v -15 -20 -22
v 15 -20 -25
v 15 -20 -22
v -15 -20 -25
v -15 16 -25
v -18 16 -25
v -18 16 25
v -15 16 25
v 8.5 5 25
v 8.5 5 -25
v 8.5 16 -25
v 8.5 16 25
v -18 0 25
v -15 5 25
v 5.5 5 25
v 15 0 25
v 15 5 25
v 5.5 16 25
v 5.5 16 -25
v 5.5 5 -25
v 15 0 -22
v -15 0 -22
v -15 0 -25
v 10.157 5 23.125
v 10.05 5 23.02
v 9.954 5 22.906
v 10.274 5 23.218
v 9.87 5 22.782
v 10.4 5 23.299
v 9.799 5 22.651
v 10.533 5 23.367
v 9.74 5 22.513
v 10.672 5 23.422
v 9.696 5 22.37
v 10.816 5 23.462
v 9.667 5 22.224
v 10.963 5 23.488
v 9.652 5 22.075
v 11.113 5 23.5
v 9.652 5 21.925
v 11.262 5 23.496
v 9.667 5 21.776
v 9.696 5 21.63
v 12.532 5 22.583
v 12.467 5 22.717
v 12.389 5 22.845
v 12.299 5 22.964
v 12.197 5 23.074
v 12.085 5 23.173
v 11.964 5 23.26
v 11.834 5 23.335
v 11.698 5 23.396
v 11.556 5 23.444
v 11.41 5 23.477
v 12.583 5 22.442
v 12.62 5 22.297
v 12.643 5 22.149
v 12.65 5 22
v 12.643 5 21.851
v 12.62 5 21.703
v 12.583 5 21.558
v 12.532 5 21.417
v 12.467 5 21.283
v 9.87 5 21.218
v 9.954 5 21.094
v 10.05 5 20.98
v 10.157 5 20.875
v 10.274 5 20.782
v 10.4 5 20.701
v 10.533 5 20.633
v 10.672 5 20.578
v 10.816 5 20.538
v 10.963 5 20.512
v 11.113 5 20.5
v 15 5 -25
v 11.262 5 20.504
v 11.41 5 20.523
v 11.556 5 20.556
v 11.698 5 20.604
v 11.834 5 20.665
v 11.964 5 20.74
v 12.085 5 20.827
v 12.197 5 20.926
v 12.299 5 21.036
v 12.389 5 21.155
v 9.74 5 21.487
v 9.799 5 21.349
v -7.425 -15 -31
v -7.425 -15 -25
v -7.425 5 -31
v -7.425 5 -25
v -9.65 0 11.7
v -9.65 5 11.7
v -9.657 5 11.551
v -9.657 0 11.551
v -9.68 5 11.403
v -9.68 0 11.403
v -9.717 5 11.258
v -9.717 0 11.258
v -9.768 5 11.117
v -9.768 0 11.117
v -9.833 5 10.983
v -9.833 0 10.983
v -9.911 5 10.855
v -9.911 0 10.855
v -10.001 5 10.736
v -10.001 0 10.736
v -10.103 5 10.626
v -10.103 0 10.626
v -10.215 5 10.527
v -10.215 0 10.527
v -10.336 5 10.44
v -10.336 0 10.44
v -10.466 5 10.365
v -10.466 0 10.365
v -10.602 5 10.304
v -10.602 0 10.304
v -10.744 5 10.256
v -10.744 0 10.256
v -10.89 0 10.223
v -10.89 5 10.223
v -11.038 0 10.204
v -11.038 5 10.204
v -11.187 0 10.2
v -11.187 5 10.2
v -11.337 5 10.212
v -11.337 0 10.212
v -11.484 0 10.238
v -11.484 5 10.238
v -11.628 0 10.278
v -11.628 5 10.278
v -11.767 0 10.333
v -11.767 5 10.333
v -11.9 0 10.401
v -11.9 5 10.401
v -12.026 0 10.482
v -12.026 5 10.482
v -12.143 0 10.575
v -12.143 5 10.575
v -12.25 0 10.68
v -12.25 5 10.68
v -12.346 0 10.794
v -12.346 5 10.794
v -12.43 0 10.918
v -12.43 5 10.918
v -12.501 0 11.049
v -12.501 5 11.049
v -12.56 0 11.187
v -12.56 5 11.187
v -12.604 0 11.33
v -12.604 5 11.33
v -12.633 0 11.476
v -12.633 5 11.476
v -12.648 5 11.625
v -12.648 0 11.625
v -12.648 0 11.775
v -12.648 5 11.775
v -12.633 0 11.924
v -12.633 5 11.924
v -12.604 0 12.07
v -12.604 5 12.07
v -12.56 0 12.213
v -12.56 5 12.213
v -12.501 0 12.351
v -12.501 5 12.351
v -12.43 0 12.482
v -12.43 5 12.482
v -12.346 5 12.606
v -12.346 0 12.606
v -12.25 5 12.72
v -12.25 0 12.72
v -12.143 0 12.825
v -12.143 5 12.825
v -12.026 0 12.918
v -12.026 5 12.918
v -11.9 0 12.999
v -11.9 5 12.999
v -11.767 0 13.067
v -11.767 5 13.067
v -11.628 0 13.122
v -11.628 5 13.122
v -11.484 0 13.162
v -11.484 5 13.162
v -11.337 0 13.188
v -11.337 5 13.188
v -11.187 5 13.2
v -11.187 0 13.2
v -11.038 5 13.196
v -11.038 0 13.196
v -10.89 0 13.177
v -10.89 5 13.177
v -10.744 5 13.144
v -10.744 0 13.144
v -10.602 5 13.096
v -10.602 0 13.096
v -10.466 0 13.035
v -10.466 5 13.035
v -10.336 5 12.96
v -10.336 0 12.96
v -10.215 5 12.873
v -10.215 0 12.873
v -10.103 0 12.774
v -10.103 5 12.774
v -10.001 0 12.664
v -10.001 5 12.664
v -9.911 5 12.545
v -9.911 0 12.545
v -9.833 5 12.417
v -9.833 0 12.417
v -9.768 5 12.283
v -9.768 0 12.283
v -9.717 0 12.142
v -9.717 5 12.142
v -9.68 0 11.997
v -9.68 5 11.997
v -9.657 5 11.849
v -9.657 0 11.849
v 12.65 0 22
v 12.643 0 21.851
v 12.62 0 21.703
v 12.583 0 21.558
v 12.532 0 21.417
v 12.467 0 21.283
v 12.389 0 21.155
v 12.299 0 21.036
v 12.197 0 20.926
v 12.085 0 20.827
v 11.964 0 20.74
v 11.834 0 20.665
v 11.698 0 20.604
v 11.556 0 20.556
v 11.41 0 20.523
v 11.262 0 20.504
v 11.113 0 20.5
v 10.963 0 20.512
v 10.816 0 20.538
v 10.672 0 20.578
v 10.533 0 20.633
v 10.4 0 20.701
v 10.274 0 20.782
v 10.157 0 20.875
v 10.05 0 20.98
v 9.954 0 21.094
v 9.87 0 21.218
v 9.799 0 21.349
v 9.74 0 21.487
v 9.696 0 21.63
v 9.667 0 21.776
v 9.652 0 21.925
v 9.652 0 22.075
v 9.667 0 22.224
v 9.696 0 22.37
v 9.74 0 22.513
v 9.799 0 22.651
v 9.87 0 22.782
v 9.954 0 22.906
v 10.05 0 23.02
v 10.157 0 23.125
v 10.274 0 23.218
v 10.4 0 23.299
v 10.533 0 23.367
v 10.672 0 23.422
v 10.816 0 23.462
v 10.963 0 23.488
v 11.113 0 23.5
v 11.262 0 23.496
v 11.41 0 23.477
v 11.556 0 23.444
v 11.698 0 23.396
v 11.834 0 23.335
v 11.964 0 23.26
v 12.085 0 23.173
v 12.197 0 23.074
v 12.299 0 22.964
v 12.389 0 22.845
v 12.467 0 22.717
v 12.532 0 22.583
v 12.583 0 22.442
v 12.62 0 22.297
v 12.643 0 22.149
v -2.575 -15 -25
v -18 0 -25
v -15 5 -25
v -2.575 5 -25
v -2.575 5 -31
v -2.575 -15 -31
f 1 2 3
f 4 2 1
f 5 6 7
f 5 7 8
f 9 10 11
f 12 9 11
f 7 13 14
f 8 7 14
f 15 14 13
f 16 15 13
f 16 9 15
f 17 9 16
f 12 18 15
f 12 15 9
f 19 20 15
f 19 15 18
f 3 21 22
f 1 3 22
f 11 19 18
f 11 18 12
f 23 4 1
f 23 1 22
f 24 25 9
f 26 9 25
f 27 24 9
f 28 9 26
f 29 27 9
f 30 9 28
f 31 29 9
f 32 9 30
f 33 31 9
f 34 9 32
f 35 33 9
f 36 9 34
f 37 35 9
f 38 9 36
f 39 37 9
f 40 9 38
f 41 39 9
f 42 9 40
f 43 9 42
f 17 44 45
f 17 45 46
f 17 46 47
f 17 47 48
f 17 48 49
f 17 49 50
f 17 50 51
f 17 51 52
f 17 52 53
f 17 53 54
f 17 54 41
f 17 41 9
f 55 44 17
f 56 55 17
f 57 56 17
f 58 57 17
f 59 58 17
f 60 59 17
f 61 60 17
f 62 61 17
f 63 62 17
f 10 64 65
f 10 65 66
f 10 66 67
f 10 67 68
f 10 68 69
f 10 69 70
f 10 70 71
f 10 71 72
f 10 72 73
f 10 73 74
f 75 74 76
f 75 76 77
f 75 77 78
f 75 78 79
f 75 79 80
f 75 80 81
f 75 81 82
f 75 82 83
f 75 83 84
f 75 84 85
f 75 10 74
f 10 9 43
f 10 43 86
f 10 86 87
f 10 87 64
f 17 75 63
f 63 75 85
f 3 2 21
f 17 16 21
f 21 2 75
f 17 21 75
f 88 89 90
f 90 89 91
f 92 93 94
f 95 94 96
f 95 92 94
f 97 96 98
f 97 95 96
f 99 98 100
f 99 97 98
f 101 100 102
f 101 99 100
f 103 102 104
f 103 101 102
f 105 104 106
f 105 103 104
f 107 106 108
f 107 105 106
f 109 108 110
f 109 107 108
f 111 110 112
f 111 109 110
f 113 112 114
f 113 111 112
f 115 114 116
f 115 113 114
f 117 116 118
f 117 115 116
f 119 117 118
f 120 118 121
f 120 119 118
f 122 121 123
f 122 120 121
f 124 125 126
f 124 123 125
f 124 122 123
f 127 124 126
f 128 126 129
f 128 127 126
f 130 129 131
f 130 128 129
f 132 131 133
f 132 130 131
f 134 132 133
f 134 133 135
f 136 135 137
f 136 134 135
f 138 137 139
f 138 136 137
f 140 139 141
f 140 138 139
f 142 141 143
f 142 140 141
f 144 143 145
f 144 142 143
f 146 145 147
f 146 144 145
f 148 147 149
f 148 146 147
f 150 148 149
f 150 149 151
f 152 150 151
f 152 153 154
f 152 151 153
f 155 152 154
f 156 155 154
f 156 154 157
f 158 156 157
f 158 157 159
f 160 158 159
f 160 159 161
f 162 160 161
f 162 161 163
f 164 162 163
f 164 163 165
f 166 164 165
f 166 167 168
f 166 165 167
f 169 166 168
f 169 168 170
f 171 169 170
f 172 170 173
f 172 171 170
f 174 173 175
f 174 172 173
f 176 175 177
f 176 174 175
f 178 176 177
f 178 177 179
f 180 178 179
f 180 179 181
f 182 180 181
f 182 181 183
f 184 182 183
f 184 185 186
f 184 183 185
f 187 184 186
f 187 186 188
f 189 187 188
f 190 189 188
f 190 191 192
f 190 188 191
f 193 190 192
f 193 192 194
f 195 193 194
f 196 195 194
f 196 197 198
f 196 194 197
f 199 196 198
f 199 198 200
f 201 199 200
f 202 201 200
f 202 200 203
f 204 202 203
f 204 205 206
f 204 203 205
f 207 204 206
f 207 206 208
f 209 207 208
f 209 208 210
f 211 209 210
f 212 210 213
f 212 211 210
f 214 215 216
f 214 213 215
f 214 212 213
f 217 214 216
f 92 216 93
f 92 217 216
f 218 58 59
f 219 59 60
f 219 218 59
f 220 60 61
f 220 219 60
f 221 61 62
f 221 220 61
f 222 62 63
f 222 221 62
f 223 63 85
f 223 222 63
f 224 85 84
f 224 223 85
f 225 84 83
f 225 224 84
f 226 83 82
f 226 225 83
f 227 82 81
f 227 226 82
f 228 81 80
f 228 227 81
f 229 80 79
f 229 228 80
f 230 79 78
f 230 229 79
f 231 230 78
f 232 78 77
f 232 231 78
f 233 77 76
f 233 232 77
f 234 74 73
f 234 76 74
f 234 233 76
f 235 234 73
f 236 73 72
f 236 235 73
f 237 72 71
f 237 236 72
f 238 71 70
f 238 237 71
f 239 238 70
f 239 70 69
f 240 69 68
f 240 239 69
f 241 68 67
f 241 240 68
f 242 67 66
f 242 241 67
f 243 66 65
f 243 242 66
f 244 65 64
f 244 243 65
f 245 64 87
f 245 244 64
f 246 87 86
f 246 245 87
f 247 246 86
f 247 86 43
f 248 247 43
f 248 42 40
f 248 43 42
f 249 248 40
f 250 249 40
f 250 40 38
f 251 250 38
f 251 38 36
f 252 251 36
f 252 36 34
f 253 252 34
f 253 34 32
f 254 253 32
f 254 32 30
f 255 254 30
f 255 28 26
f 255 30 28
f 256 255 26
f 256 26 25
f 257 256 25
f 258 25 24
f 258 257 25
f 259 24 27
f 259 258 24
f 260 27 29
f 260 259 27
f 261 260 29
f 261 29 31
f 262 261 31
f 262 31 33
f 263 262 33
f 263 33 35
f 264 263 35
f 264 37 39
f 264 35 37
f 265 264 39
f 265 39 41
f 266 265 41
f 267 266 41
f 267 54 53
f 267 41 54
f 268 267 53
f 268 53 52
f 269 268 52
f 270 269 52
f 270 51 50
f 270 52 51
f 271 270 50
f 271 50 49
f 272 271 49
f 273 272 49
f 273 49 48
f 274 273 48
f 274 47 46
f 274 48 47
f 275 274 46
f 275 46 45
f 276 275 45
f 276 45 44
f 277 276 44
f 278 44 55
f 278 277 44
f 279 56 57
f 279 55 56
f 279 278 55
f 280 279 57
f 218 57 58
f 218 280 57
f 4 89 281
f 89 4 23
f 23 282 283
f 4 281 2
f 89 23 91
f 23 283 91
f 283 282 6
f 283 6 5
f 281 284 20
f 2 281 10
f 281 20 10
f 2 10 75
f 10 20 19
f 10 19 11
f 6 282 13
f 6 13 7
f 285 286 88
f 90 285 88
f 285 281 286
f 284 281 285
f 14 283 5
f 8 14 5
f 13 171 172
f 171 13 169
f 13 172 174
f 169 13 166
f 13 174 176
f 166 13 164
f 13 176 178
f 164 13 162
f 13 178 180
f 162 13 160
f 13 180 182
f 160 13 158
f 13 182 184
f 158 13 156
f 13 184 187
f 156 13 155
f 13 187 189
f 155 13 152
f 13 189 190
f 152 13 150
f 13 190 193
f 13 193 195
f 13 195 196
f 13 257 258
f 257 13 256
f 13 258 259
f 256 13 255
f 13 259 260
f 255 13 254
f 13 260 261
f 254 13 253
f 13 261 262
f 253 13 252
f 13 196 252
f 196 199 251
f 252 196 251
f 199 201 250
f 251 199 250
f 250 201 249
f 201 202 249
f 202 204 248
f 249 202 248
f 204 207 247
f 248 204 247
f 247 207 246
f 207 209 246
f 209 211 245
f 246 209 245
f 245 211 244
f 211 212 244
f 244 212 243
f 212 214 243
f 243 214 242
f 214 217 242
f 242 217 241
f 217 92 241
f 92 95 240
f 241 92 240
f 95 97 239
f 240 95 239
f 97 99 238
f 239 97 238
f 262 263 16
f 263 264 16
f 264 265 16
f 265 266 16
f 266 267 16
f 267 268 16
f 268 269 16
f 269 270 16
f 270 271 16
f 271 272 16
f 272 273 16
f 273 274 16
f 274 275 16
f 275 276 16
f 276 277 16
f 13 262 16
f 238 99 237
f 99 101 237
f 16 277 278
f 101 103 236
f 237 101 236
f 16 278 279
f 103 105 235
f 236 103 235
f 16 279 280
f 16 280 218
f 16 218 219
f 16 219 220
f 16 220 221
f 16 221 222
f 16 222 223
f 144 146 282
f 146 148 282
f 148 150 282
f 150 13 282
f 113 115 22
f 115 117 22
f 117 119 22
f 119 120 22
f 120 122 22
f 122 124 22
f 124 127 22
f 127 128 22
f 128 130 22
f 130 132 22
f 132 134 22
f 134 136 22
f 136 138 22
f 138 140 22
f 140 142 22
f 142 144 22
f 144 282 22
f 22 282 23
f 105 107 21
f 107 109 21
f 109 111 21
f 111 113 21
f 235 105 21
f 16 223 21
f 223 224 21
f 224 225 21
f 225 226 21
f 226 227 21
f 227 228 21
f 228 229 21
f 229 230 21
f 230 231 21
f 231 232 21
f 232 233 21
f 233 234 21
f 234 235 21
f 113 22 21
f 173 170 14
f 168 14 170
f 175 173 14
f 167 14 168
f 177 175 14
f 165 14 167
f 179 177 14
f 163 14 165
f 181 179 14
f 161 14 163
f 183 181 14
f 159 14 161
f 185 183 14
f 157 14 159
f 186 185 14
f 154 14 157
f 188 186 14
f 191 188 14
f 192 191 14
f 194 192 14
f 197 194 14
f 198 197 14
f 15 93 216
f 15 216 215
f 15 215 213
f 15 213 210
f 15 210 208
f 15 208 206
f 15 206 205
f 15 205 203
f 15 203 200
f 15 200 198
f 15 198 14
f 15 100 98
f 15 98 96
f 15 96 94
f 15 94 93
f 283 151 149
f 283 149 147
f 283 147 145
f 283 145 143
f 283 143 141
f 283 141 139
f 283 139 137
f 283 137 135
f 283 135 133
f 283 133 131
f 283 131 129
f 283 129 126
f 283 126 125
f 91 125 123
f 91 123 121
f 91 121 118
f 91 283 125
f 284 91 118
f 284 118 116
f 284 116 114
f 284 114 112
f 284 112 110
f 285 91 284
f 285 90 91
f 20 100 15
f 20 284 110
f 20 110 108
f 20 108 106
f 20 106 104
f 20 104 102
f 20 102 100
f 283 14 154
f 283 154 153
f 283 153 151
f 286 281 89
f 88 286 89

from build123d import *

# Parameters (mm, degrees)
SKETCH_1_W               = 30
SKETCH_1_H               = 50
EXTRUDE_1_DEPTH          = 5
SKETCH_2_R               = 1.5
CUT_EXTRUDE_2_DEPTH      = 6
CUT_EXTRUDE_2_DEPTH_BACK = 3
SKETCH_3_W               = 30
SKETCH_3_H               = 25
EXTRUDE_2_DEPTH          = 3
SKETCH_4_W               = 4.85
SKETCH_4_H               = 20
EXTRUDE_3_DEPTH          = 6
EXTRUDE_START            = -50
SKETCH_6_W               = 3
SKETCH_6_H               = 16
EXTRUDE_4_DEPTH          = 50


with BuildPart() as part:
    # 스케치1 → 보스-돌출1 (new body)
    with BuildSketch(Plane(origin=(0, 0, 0), x_dir=(1, 0, 0), z_dir=(0, 1, 0))):
        Rectangle(SKETCH_1_W, SKETCH_1_H)
    extrude(amount=EXTRUDE_1_DEPTH)

    # 스케치2 → 컷-돌출2 (cut, two sides)
    with BuildSketch(Plane(origin=(0, 0, 0), x_dir=(1, 0, 0), z_dir=(0, 1, 0))) as cut_extrude_2_sk:
        with Locations((-11.15, -11.7)):
            Circle(SKETCH_2_R)
        with Locations((11.15, -22)):
            Circle(SKETCH_2_R)
    extrude(amount=CUT_EXTRUDE_2_DEPTH, mode=Mode.SUBTRACT)
    extrude(cut_extrude_2_sk.sketch, amount=-CUT_EXTRUDE_2_DEPTH_BACK, mode=Mode.SUBTRACT)

    # 스케치3 → 보스-돌출2 (add)
    with BuildSketch(Plane(origin=(0, 0, -25), x_dir=(-1, 0, 0), z_dir=(0, 0, -1))):
        with Locations((0, -7.5)):
            Rectangle(SKETCH_3_W, SKETCH_3_H)
    extrude(amount=-EXTRUDE_2_DEPTH)

    # 스케치4 → 보스-돌출3 (add)
    with BuildSketch(Plane(origin=(0, 0, -25), x_dir=(-1, 0, 0), z_dir=(0, 0, -1))):
        with Locations((5, -5)):
            Rectangle(SKETCH_4_W, SKETCH_4_H)
    extrude(amount=EXTRUDE_3_DEPTH)

    # 스케치6 → 보스-돌출4 (add)
    with BuildSketch(Plane.XY.offset(25).offset(EXTRUDE_START)):
        with Locations((-16.5, 8)):
            Rectangle(SKETCH_6_W, SKETCH_6_H)
        with Locations((7, 8)):
            Rectangle(SKETCH_6_W, SKETCH_6_H)
    extrude(amount=EXTRUDE_4_DEPTH)


solid = part.part
